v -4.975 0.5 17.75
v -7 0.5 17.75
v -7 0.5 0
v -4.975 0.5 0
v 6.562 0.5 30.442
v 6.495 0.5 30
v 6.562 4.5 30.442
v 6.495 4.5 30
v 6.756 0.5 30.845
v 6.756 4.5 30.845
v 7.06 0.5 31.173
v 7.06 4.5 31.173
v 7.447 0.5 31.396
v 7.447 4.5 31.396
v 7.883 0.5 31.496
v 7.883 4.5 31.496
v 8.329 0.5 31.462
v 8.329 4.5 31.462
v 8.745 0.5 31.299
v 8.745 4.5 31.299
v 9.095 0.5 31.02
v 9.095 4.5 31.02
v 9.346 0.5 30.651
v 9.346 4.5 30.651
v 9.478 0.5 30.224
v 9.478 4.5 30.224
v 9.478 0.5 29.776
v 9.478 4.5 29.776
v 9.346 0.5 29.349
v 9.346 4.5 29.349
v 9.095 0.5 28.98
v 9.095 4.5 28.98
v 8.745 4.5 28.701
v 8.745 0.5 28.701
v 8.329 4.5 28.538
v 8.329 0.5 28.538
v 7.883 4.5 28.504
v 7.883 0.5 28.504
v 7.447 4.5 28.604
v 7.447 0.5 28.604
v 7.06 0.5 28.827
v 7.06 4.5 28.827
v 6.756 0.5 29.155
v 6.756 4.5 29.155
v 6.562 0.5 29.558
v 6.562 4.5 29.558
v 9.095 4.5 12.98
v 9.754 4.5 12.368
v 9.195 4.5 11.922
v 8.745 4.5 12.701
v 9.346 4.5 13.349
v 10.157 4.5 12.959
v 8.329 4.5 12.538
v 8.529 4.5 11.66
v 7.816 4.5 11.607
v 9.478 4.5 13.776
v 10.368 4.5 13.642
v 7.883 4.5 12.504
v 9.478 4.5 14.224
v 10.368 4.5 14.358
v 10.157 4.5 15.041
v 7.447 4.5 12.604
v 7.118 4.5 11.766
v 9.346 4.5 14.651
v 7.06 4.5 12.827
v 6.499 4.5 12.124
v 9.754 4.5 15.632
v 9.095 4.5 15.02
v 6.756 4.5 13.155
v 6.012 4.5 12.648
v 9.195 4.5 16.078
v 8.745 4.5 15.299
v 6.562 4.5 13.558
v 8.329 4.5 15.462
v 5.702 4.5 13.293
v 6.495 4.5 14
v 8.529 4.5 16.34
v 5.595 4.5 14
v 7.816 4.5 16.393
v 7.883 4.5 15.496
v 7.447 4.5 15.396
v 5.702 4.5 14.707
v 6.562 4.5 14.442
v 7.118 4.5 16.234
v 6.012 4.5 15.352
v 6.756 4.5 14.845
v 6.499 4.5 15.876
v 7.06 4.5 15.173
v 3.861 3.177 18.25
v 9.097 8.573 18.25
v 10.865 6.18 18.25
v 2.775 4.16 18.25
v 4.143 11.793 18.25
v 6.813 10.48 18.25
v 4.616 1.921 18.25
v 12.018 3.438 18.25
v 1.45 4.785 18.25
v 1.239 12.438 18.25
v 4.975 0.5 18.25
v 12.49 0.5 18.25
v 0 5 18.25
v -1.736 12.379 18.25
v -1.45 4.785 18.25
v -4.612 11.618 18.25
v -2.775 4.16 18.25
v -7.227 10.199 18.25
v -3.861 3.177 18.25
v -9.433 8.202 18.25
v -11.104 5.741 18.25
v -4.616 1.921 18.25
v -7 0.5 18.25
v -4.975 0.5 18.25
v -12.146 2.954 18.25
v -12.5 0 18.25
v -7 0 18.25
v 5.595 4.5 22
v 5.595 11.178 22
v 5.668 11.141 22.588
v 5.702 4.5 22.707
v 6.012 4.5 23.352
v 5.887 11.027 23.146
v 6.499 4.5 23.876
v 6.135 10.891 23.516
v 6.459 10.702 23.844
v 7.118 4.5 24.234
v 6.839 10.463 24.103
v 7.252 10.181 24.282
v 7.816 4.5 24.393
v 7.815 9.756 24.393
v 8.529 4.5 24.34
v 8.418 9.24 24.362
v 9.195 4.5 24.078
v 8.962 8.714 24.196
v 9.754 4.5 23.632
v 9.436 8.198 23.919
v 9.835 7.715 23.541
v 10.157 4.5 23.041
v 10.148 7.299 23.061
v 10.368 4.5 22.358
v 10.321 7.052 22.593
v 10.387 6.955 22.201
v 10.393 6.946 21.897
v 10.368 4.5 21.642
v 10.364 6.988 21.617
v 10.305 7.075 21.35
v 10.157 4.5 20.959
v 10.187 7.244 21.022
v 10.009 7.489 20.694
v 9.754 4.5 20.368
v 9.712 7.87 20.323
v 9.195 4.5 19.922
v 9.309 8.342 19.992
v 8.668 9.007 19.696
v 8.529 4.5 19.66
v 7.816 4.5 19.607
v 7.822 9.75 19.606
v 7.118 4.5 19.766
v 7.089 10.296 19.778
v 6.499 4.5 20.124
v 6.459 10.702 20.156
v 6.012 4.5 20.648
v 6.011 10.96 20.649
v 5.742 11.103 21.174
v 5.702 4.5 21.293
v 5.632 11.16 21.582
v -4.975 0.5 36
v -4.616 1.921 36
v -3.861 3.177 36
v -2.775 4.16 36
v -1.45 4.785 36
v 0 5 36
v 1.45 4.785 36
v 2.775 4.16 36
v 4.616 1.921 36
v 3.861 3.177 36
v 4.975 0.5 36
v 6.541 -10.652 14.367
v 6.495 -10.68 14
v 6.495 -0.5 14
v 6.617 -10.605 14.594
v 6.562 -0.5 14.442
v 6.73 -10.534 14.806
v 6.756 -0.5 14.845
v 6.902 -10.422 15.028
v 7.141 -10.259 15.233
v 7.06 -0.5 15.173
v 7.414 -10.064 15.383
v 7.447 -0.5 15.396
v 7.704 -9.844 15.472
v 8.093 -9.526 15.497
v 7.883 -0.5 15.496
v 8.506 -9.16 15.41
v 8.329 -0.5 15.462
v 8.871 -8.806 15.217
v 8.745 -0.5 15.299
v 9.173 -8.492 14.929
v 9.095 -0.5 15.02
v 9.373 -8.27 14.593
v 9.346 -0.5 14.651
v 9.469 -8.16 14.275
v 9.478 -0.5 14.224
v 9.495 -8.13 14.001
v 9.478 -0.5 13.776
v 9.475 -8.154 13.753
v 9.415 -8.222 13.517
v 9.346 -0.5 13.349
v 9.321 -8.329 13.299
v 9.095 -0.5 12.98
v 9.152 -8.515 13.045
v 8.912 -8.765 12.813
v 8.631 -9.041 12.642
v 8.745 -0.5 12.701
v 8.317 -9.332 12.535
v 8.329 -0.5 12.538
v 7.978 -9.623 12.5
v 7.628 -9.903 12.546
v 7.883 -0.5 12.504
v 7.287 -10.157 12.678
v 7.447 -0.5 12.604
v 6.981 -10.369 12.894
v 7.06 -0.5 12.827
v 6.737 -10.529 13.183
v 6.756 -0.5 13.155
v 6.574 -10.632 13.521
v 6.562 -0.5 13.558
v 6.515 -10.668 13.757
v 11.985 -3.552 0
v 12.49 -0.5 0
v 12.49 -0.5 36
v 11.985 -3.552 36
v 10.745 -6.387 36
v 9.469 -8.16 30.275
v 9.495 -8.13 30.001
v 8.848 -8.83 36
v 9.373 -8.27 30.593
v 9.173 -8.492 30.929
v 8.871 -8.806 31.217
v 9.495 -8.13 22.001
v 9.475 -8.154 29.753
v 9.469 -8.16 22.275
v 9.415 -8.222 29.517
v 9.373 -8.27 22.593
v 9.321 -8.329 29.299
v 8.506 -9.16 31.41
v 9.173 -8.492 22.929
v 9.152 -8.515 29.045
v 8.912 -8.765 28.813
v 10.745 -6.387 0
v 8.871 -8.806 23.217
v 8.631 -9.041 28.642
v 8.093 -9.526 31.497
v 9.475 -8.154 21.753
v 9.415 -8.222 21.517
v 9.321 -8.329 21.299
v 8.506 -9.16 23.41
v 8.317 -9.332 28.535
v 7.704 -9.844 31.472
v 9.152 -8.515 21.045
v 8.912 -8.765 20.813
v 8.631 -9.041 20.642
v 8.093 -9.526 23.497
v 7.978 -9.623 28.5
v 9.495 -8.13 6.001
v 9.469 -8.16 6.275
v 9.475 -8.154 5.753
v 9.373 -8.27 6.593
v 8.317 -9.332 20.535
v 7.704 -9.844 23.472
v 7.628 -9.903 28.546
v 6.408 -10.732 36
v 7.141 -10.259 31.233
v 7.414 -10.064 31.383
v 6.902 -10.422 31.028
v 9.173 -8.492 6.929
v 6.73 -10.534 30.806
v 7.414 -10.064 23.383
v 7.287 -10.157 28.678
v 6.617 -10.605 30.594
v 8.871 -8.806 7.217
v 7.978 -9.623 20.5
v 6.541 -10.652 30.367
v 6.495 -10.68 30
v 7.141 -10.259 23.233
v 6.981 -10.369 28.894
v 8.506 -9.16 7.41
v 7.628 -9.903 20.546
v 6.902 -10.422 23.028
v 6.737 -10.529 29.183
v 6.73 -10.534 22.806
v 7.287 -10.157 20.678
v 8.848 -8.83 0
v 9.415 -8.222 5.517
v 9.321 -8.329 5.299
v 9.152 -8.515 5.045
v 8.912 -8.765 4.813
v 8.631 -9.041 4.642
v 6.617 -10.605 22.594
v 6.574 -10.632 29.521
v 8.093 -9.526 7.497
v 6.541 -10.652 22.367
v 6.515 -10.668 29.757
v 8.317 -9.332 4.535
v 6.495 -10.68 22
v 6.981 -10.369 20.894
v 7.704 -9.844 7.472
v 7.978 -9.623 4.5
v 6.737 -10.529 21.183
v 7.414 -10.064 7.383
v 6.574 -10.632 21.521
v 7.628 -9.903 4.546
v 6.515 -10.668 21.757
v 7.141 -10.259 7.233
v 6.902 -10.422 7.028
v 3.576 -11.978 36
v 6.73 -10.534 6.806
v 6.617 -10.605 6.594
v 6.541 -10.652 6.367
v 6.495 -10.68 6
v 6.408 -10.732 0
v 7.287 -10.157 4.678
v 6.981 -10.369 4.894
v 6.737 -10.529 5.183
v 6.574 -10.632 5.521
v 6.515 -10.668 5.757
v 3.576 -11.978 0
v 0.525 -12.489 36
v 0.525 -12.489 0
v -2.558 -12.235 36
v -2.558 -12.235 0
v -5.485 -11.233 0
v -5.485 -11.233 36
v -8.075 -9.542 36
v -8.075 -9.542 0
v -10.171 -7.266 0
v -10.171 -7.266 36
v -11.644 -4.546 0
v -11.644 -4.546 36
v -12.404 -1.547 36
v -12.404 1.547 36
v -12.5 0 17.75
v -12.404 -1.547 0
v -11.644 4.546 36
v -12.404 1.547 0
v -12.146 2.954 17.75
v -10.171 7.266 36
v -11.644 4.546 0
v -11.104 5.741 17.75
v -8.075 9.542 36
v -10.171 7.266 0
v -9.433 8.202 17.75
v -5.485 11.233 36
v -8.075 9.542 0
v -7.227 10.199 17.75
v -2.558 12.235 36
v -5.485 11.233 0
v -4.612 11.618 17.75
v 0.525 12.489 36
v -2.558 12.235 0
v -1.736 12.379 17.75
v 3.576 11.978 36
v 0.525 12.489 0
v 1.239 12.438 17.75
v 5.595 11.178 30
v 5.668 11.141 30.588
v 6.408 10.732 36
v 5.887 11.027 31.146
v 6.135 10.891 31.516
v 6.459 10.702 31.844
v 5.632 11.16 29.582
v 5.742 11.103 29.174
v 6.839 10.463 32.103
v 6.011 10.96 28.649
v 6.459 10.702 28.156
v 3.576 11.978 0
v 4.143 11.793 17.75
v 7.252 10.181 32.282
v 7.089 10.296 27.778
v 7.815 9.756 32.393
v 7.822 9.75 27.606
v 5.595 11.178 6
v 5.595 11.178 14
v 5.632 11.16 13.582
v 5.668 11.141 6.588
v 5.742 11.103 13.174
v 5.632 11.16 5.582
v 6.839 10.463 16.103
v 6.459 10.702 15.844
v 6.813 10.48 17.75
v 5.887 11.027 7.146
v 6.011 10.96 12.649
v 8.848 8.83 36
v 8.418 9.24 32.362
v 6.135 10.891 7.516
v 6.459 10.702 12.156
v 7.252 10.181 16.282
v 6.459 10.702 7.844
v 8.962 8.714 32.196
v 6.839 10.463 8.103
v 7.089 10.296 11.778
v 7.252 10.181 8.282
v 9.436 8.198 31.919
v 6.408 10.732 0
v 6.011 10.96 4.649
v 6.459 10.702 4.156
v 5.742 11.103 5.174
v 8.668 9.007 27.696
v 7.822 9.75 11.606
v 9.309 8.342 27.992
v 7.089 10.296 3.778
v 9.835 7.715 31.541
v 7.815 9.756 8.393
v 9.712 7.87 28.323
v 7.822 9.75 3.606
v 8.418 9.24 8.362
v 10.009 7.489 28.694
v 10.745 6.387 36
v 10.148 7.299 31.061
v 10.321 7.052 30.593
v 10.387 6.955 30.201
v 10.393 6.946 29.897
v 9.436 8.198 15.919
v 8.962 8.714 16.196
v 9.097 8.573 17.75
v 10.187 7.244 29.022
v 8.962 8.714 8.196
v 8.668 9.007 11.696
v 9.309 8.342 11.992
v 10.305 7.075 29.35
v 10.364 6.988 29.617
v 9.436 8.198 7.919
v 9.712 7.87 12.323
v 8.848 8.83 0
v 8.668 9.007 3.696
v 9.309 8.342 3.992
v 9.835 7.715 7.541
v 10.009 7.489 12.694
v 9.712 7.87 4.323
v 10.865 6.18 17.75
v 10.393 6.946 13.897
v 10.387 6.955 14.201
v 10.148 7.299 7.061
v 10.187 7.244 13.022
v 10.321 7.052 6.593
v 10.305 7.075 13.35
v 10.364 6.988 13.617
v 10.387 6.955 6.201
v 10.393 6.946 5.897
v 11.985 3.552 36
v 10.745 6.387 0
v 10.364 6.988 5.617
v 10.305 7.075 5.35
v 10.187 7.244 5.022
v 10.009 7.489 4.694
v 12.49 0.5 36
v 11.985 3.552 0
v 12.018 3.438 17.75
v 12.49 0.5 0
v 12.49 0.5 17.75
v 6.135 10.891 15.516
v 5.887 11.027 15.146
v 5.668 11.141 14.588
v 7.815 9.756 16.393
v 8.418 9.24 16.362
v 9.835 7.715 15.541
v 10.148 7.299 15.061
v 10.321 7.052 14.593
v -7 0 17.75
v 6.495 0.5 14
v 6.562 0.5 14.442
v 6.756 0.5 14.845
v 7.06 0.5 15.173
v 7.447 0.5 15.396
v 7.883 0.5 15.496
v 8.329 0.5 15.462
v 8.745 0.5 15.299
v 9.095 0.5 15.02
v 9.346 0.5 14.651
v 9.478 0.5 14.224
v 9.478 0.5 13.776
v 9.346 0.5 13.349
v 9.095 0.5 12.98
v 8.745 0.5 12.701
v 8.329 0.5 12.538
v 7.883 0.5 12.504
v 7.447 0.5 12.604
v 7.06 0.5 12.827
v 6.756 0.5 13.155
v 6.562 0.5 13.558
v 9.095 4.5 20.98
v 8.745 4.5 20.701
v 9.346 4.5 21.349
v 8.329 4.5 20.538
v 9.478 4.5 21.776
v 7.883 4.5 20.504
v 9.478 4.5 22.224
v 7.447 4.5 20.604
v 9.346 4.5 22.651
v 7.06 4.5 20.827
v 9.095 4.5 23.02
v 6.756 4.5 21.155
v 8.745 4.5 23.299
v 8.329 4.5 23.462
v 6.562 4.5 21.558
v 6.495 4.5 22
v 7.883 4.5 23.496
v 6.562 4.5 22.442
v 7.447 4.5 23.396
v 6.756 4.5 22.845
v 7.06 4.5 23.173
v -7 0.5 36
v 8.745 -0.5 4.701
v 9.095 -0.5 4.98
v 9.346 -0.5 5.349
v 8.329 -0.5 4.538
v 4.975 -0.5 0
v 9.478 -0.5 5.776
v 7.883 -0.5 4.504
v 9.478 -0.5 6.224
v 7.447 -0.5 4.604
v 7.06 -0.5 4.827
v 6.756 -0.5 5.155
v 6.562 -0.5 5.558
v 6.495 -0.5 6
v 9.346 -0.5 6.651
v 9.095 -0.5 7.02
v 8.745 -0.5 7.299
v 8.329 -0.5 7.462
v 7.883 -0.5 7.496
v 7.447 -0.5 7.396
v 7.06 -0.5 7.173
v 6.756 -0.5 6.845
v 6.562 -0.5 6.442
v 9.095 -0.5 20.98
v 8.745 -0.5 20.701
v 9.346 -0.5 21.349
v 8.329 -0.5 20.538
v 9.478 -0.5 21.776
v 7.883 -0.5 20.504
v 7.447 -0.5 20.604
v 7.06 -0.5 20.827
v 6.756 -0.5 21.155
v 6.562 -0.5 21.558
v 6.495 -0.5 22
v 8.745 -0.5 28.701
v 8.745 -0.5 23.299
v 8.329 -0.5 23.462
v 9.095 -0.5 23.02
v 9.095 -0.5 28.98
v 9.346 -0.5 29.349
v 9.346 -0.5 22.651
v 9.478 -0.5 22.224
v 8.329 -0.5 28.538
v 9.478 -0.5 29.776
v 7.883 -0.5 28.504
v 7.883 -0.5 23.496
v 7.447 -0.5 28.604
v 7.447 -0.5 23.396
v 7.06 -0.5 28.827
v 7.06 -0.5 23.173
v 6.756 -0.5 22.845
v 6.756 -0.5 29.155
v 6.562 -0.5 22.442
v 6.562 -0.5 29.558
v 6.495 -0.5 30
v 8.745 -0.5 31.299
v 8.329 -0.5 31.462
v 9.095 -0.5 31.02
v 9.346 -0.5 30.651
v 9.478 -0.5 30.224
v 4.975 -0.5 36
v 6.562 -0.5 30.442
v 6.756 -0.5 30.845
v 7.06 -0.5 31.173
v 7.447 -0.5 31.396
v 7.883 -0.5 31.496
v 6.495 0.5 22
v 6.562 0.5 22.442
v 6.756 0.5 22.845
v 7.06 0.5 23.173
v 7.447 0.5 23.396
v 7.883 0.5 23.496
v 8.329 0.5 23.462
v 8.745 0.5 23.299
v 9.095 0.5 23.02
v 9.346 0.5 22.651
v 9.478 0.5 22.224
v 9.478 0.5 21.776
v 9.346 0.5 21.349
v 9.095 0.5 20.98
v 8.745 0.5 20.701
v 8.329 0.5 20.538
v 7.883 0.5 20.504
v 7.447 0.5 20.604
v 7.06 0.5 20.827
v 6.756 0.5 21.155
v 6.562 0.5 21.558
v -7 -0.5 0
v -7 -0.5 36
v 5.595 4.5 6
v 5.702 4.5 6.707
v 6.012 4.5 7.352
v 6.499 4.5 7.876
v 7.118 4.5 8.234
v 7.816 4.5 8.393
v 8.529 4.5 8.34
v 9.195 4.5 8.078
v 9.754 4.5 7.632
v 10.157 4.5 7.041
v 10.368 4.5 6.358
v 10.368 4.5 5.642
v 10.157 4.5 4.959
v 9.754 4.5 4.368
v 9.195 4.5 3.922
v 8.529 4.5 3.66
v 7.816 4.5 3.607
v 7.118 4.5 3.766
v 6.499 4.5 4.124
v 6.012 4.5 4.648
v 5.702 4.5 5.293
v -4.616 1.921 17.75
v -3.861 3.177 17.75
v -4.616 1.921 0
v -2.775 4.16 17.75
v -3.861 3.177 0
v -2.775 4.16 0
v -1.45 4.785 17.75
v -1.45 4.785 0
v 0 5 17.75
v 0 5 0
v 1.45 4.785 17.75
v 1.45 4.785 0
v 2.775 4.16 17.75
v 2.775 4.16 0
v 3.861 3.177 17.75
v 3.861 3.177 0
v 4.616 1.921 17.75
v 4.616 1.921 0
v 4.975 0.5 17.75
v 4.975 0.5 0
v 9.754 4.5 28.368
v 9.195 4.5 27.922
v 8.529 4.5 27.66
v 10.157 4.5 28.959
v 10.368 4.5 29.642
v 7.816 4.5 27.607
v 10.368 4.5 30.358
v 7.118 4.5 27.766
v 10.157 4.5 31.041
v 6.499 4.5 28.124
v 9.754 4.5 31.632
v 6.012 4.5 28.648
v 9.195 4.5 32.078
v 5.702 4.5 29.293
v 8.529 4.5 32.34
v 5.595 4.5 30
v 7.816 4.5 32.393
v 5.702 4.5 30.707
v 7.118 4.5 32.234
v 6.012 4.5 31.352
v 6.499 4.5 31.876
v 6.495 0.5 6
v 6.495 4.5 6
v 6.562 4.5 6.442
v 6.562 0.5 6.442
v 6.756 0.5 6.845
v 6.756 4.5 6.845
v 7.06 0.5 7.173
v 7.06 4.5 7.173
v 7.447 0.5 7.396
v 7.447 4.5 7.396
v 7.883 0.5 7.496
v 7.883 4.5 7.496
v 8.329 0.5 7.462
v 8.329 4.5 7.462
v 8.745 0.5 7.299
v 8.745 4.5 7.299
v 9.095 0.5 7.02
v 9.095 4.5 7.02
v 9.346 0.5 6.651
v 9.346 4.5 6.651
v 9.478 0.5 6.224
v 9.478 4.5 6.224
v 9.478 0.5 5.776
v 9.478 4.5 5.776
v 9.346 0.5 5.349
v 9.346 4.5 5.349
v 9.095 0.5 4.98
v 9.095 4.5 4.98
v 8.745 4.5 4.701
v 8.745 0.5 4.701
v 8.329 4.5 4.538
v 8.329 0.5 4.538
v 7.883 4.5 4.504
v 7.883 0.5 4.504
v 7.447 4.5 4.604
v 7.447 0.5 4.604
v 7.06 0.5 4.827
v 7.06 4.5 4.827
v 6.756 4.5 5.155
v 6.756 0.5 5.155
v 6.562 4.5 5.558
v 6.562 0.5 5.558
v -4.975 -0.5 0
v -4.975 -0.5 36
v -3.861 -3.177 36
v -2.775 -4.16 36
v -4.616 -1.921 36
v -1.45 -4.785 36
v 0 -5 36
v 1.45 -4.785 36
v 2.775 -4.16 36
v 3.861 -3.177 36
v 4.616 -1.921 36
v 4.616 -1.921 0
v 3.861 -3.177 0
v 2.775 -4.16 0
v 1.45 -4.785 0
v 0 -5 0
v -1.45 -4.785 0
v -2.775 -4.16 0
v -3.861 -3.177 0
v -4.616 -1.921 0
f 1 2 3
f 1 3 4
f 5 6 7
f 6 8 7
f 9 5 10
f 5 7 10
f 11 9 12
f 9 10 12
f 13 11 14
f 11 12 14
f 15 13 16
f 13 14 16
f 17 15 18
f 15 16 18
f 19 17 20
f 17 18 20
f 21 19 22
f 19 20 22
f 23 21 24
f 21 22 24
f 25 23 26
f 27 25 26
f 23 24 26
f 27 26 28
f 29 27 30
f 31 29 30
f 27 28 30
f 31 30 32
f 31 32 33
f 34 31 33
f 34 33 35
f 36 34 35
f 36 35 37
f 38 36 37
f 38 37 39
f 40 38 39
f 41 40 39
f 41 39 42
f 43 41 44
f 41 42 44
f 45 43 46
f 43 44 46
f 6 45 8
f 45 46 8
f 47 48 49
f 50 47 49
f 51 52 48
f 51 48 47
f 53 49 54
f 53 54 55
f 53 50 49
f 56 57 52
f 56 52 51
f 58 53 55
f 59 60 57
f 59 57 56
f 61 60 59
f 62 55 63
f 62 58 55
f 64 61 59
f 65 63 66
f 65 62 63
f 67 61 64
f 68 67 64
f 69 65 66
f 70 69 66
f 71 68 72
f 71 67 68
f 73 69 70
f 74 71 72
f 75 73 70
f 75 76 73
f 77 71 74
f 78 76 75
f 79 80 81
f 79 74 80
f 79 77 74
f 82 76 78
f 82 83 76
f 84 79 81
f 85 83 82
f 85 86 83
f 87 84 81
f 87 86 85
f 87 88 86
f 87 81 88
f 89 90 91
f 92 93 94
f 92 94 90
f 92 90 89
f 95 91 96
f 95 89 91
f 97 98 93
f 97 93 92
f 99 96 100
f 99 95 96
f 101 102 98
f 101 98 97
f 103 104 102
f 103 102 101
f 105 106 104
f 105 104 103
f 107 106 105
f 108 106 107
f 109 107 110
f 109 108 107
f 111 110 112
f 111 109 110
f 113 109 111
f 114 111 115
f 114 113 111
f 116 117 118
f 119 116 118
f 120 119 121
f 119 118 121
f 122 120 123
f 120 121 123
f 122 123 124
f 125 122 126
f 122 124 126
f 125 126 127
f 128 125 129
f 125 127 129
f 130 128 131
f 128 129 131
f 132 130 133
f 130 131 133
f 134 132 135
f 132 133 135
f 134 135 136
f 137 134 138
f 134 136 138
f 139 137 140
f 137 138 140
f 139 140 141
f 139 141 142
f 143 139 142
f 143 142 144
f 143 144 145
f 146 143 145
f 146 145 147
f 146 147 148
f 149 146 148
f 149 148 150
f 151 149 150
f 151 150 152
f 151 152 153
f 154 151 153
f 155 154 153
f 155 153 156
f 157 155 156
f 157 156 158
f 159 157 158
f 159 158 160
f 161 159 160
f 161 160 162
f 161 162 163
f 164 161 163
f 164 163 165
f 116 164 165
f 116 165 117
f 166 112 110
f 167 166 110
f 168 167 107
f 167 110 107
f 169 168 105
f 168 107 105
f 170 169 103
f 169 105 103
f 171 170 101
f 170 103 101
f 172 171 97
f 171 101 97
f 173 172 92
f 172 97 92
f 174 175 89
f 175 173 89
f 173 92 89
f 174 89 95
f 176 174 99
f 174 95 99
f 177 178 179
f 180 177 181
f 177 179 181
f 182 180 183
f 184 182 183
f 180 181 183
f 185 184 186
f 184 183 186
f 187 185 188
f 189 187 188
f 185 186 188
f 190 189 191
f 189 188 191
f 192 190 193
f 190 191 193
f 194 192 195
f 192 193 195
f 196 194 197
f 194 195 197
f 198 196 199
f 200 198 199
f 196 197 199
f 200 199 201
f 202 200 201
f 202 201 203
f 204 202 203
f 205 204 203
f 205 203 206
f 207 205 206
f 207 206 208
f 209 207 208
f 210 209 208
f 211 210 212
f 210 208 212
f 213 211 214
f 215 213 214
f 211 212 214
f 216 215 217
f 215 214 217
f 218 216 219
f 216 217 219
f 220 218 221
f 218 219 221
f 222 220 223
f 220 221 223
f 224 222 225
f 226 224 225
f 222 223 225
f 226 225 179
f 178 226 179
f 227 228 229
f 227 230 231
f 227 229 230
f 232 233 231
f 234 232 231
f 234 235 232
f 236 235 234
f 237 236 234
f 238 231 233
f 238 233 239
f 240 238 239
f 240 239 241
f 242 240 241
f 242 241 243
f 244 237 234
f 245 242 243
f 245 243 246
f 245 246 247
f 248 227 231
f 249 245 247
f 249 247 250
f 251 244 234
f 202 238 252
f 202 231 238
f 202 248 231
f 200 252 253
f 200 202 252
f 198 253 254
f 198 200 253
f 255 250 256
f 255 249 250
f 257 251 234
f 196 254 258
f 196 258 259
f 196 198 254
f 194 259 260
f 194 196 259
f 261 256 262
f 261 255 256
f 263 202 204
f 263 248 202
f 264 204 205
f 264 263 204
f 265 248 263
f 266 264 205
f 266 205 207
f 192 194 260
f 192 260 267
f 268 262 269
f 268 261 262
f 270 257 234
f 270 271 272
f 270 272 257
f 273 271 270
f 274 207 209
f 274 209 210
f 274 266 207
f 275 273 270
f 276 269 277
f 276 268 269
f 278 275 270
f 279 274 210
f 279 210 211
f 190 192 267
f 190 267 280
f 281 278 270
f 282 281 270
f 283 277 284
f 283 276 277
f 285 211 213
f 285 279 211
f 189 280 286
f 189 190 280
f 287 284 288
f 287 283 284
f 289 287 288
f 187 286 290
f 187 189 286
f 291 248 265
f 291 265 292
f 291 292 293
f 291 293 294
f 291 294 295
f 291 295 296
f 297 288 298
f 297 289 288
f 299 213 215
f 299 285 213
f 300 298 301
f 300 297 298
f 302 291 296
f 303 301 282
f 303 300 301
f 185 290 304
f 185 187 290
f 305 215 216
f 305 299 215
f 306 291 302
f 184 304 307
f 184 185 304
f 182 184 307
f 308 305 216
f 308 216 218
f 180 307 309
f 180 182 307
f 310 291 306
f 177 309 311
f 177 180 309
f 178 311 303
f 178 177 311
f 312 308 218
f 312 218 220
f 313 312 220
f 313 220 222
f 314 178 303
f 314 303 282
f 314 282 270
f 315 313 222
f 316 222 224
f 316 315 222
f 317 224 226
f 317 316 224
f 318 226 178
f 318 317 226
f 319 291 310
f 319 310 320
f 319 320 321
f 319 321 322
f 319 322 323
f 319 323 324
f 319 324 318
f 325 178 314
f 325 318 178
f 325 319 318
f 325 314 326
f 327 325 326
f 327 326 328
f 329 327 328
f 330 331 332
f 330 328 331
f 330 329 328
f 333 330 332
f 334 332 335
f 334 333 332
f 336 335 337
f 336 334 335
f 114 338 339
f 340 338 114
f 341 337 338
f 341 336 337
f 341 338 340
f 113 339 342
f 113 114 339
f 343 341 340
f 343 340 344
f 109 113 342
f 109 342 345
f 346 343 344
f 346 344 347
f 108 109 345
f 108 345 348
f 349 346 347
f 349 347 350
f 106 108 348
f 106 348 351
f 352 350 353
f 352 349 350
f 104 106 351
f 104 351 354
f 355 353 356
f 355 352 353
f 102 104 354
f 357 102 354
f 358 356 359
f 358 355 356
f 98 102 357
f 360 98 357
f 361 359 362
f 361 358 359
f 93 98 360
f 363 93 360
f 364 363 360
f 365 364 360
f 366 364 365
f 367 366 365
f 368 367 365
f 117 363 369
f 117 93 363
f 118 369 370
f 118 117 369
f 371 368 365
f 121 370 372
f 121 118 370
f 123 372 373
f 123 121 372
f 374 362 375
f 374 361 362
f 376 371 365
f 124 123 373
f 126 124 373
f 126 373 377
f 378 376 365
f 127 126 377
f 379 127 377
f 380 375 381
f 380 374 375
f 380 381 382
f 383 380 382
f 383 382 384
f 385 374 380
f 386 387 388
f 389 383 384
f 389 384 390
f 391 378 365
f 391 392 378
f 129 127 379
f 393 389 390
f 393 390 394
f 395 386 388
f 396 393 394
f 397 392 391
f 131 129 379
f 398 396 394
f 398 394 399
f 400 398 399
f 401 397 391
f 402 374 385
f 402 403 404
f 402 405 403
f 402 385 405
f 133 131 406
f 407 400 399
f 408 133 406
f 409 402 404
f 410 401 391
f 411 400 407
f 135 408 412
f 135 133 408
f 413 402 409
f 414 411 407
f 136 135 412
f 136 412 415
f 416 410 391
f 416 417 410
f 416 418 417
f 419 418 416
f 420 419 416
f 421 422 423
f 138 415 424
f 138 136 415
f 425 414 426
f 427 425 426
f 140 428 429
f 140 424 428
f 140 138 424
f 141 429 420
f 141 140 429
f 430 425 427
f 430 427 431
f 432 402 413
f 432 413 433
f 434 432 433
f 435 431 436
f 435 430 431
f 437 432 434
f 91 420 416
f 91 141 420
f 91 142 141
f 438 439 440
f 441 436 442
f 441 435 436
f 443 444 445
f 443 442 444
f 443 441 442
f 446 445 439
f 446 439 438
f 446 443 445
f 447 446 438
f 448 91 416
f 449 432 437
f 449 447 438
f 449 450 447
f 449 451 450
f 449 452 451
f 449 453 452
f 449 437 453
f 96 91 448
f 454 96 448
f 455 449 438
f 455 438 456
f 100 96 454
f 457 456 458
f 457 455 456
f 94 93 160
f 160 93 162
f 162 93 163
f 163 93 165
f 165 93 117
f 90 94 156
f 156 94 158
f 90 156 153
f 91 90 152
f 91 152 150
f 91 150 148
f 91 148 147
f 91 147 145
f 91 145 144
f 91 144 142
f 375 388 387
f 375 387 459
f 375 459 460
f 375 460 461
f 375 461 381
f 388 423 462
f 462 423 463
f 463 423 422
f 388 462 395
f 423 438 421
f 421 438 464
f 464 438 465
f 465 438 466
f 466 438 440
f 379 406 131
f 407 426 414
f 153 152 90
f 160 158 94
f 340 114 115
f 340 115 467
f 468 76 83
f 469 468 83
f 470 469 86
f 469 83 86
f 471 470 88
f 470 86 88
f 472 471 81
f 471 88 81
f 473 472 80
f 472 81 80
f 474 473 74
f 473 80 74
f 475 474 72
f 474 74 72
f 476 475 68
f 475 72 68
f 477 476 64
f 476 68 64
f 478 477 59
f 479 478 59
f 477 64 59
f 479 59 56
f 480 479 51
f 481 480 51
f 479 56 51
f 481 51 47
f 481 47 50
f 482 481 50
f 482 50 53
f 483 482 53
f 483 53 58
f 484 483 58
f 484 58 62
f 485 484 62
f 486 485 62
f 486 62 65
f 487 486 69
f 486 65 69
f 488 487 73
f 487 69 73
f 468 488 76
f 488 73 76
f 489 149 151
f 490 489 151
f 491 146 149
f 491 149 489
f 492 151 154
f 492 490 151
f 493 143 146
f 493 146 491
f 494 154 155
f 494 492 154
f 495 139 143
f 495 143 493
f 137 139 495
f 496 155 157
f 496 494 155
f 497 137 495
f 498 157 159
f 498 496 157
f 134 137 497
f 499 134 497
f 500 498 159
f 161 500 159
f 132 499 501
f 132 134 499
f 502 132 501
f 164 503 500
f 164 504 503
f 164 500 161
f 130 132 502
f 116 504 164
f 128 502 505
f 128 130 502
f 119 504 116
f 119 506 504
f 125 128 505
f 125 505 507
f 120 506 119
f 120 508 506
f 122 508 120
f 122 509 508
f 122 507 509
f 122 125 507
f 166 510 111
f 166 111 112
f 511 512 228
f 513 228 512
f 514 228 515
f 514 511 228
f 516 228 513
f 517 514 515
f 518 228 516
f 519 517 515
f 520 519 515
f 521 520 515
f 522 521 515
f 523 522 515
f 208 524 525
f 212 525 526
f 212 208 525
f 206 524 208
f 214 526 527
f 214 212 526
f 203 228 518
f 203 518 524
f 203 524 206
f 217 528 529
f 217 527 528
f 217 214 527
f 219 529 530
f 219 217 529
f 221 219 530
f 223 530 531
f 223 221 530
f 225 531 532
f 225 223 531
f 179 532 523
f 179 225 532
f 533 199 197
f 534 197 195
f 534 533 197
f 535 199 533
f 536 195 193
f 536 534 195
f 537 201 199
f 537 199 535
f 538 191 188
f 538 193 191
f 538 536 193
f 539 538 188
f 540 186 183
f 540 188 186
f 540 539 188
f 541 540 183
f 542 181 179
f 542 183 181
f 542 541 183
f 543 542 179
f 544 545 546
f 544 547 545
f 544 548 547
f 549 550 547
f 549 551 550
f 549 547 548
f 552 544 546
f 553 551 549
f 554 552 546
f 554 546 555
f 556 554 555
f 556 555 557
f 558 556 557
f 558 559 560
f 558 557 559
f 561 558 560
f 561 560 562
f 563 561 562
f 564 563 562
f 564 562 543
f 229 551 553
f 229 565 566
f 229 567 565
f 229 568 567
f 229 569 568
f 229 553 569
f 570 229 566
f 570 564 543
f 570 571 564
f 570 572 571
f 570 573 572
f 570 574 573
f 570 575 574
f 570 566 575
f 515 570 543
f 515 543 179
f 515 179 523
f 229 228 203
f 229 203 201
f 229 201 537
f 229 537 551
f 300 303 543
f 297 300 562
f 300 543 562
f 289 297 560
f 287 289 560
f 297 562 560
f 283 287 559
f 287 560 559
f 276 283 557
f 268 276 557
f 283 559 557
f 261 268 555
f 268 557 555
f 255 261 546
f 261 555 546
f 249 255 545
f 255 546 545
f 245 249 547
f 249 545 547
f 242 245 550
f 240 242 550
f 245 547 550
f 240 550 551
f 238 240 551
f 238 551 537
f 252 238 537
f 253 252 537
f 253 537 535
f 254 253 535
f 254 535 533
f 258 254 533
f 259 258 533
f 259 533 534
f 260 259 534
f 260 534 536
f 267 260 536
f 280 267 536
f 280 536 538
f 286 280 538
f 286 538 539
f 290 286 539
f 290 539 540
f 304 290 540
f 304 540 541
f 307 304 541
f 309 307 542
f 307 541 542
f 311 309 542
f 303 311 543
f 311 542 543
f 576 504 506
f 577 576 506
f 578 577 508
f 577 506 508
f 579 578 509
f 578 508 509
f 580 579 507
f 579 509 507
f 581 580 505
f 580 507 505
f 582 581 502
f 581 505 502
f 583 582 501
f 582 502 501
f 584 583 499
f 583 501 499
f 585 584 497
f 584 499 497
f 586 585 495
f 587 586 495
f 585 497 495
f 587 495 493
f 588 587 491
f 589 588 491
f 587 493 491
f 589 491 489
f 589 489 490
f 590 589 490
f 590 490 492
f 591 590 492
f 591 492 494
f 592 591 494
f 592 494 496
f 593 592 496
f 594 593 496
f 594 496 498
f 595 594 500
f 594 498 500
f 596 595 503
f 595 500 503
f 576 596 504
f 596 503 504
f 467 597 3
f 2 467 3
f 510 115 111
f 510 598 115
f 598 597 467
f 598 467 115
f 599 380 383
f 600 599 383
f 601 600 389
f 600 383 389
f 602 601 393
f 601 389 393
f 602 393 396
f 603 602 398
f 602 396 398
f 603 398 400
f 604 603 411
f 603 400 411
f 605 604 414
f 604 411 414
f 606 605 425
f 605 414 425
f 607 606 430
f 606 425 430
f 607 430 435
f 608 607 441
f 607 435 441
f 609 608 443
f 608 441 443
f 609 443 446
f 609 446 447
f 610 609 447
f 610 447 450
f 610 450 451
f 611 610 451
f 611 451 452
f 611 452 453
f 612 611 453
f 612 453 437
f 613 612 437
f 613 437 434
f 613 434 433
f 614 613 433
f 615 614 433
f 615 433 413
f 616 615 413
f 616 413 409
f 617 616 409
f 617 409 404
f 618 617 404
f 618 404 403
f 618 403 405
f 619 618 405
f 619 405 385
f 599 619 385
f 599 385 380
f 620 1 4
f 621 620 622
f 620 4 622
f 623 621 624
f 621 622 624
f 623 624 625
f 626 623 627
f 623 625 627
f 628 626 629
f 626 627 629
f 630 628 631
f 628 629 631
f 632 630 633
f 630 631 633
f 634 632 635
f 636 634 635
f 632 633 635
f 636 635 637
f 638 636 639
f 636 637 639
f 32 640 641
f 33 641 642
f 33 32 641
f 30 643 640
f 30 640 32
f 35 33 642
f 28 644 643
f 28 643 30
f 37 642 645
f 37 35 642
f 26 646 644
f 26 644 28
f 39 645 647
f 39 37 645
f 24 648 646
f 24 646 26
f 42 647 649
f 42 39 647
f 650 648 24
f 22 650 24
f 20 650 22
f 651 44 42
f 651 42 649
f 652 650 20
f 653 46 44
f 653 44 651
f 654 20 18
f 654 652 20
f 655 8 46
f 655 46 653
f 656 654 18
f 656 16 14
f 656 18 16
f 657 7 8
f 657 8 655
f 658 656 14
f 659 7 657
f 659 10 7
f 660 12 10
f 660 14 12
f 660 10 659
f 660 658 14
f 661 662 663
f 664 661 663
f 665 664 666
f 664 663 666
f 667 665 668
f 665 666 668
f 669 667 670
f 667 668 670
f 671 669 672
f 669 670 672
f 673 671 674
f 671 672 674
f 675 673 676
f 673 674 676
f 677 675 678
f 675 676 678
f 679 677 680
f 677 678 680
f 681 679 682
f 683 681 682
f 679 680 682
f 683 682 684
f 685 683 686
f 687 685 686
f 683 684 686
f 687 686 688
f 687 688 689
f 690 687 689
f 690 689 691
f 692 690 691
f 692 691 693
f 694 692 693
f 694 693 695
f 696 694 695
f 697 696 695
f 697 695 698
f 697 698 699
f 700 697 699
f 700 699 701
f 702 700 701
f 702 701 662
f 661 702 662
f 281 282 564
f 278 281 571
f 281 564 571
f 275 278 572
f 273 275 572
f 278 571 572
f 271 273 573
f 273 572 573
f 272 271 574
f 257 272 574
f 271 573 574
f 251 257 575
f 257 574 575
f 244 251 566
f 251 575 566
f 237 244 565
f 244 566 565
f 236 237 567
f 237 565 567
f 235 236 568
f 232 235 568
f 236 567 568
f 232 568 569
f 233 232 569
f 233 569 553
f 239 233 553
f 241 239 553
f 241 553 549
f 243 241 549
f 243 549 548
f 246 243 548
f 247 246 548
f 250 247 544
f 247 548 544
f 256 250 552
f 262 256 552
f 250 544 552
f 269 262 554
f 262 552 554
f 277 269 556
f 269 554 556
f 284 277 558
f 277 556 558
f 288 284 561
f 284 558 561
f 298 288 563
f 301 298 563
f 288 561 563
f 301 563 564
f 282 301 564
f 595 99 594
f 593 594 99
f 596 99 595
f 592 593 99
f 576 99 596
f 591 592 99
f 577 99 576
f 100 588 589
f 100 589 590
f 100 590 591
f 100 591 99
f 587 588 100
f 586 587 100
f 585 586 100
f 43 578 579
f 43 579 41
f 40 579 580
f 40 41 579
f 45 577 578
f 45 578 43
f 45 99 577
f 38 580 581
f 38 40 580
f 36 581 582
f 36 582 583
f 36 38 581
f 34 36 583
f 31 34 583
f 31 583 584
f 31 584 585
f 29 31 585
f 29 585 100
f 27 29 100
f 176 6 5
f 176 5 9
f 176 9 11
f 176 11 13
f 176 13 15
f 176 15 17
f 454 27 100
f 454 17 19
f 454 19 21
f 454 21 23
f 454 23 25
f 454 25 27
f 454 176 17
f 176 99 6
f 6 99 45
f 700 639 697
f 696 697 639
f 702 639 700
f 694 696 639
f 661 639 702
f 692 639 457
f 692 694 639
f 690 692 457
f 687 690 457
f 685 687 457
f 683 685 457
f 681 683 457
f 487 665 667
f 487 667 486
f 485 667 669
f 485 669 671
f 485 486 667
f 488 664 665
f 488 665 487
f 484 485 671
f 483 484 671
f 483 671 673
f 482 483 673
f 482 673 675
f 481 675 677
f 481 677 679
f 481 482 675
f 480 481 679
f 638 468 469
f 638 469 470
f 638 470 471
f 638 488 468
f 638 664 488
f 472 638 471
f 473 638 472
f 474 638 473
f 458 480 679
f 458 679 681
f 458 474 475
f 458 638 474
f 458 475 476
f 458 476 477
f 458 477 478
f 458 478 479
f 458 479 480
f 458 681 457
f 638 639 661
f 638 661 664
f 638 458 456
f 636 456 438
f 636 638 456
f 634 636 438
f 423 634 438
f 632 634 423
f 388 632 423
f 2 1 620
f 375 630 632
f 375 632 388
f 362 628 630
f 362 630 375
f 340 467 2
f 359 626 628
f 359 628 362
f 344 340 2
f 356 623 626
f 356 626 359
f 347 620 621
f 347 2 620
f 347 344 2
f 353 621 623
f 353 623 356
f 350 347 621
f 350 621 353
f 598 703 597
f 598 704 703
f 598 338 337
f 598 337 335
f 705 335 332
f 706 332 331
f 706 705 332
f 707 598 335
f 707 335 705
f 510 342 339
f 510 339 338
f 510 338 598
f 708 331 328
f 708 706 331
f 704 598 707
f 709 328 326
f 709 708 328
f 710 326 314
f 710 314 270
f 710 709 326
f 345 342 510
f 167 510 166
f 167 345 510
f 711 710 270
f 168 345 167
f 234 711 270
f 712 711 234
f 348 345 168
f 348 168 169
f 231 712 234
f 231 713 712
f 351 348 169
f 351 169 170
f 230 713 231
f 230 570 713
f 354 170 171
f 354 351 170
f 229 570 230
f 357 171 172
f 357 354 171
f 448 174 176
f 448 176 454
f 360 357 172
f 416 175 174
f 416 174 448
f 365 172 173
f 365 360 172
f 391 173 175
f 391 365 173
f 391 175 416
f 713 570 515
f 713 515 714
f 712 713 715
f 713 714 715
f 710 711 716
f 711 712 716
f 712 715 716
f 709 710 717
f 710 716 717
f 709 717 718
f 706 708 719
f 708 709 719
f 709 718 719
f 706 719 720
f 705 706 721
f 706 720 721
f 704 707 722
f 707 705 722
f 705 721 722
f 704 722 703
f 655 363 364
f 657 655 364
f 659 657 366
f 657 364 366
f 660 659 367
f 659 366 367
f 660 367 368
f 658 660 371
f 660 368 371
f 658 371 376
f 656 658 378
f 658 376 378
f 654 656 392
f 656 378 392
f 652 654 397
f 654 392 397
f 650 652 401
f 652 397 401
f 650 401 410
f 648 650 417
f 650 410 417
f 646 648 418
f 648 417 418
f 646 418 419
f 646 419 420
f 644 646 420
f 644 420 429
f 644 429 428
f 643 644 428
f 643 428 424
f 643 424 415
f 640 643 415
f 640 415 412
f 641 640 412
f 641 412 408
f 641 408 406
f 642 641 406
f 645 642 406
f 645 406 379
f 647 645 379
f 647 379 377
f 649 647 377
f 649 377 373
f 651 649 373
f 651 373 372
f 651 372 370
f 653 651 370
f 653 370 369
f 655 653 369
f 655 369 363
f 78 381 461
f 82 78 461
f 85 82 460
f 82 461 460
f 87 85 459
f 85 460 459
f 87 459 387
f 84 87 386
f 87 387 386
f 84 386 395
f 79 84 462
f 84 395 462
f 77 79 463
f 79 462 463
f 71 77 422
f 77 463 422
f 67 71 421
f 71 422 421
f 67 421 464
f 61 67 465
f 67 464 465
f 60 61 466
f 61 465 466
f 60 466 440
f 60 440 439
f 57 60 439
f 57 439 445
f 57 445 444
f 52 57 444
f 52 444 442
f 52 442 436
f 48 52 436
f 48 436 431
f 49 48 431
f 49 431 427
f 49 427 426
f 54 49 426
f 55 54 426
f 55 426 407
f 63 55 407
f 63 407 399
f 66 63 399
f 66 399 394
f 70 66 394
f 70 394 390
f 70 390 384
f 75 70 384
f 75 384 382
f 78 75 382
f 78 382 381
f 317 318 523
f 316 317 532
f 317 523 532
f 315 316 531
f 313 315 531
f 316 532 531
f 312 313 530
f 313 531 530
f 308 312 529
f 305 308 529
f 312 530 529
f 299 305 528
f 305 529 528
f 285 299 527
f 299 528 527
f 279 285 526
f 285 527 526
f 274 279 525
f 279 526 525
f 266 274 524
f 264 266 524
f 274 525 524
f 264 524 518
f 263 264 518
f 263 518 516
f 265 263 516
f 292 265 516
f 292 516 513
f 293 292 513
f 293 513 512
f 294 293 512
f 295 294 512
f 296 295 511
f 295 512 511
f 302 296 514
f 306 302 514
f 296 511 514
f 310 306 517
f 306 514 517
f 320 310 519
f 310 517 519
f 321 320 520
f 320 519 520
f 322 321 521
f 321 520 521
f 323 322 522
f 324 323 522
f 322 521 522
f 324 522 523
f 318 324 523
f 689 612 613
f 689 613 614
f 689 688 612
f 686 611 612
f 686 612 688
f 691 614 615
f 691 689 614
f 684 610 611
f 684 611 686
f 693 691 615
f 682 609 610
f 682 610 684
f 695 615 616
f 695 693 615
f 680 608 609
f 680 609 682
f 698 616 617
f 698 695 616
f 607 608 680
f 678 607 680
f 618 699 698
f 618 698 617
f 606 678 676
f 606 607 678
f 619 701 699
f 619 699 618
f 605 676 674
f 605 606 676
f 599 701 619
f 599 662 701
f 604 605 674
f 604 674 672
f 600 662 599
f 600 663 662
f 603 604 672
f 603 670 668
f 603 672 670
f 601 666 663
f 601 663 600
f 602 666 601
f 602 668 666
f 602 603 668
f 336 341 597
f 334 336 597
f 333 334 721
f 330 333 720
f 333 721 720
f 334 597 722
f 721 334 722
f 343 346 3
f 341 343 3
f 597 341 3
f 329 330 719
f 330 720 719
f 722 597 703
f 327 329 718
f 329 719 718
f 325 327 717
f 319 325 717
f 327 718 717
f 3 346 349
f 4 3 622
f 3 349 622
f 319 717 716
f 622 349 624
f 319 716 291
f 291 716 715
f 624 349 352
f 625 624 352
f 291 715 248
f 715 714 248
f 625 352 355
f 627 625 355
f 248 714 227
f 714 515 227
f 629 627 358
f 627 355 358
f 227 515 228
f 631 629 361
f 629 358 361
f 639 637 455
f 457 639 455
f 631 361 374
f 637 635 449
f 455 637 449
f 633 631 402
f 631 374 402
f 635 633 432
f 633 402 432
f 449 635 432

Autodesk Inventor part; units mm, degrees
ref_plane "YZ Plane" through (0, 0, 0) normal (1, 0, 0) x (0, 1, 0)
ref_plane "XY Plane" through (0, 0, 0) normal (0, 0, 1) x (1, 0, 0)
sketch "Sketch1" plane through (0, 0, 0) normal (0, 0, 1) x (1, 0, 0)
  circle A0 centre (0, 0) radius 12.5
  circle A1 centre (0, 0) radius 5
  dimension "d0" = 25
  dimension "d1" = 10
extrude "Extrusion1" add sketch "Sketch1" along normal blind 36
sketch "Sketch3" plane through (0, 0, 36) normal (0, 0, 1) x (1, 0, 0)
  line L0 (-7, 0.5) -> (12.5, 0.5)
  line L1 (12.5, 0.5) -> (12.5, -0.5)
  line L2 (12.5, -0.5) -> (-7, -0.5)
  line L3 (-7, -0.5) -> (-7, 0.5)
  line L4 (-7, 0.5) -> (12.5, -0.5) construction
  line L5 (12.5, 0.5) -> (-7, -0.5) construction
  circle A0 centre (0, 0) radius 12.5 projected
  point P0 (-7, 0)
  point P1 (2.75, 0)
  point P2 (-7, 0)
  point P3 (12.5, 0)
  point P4 (12.49, -0.5)
  point P5 (12.49, 0.5)
  dimension "d7" = 1
  dimension "d10" = 7
extrude "Extrusion3" cut sketch "Sketch3" against normal through all contours L0 A0 L2 L3 picked at (-0.5, 0)
sketch "Sketch4" plane through (0, 0, 0) normal (1, 0, 0) x (0, 1, 0)
  line L0 (30, 18.25) -> (0, 18.25)
  line L1 (0, 18.25) -> (0, 17.75)
  line L2 (0, 17.75) -> (30, 17.75)
  line L3 (30, 17.75) -> (30, 18.25)
  line L4 (30, 18.25) -> (0, 17.75) construction
  line L5 (0, 18.25) -> (30, 17.75) construction
  line L6 (12.5, 0) -> (-12.5, 0) projected
  point P0 (0, 0)
  point P1 (15, 18)
  point P2 (0.5, 0)
  point P3 (-0.5, 0)
  point P4 (15, 18.25)
  dimension "d11" = 0.5
  dimension "d12" = 0
  dimension "d13" = 30
  dimension "d18" = 18
extrude "Extrusion4" cut sketch "Sketch4" along normal through all both and the other way through all
ref_plane "Work Plane1" through (0, 12.5, 0) normal (0, 1, 0) x (-1, 0, 0)
sketch "Sketch5" plane through (0, 12.5, 0) normal (0, 1, 0) x (-1, 0, 0)
  circle A0 centre (-7.995, 22) radius 2.4
  line L0 (14.0583, 18) -> (-17.4822, 18)
  line L1 (12.5, 0) -> (-12.49, 0) projected
  circle A1 centre (-7.995, 30) radius 2.4
  line L2 (12.5, 36) -> (-12.49, 36) projected
  circle A2 centre (-7.995, 14) radius 2.4
  circle A3 centre (-7.995, 6) radius 2.4
  point P0 (0, 0)
  point P1 (0.005, 36)
  dimension "d17" = 18
  dimension "d19" = 4.8
  dimension "d20" = 4.8
  dimension "d21" = 8
  dimension "d22" = 6
  dimension "d23" = 8
extrude "Extrusion5" cut sketch "Sketch5" against normal blind 8
sketch "Sketch6" plane through (0, 12.5, 0) normal (0, 1, 0) x (-1, 0, 0)
  circle A0 centre (-7.995, 30) radius 2.4 projected
  circle A1 centre (-7.995, 30) radius 1.5
  circle A2 centre (-7.995, 22) radius 2.4 projected
  circle A3 centre (-7.995, 22) radius 1.5
  circle A4 centre (-7.995, 14) radius 2.4 projected
  circle A5 centre (-7.995, 14) radius 1.5
  circle A6 centre (-7.995, 6) radius 2.4 projected
  circle A7 centre (-7.995, 6) radius 1.5
  point P0 (0, 0)
  dimension "d26" = 3
extrude "Extrusion6" cut sketch "Sketch6" against normal through all contours A1 | A3 | A5 | A7
sketch "Sketch2" plane through (0, 0, 0) normal (0, 1, 0) x (-1, 0, 0)
  circle A0 centre (0, 5.5789) radius 1.6
  line L0 (16.8162, 18) -> (-14.2715, 18)
  line L1 (12.5, 36) -> (-12.5, 36) projected
  line L2 (12.5, 0) -> (-12.5, 0) projected
  line L3 (12.5, 36) -> (12.5, 18)
  line L4 (12.5, 18) -> (12.5, 0)
  circle A1 centre (0, 30.4211) radius 1.6
  point P0 (0, 0)
  dimension "d4" = 3.2
equation "\"d20\" = d19"
properties part number "coupling" material "Aluminum 6061"
